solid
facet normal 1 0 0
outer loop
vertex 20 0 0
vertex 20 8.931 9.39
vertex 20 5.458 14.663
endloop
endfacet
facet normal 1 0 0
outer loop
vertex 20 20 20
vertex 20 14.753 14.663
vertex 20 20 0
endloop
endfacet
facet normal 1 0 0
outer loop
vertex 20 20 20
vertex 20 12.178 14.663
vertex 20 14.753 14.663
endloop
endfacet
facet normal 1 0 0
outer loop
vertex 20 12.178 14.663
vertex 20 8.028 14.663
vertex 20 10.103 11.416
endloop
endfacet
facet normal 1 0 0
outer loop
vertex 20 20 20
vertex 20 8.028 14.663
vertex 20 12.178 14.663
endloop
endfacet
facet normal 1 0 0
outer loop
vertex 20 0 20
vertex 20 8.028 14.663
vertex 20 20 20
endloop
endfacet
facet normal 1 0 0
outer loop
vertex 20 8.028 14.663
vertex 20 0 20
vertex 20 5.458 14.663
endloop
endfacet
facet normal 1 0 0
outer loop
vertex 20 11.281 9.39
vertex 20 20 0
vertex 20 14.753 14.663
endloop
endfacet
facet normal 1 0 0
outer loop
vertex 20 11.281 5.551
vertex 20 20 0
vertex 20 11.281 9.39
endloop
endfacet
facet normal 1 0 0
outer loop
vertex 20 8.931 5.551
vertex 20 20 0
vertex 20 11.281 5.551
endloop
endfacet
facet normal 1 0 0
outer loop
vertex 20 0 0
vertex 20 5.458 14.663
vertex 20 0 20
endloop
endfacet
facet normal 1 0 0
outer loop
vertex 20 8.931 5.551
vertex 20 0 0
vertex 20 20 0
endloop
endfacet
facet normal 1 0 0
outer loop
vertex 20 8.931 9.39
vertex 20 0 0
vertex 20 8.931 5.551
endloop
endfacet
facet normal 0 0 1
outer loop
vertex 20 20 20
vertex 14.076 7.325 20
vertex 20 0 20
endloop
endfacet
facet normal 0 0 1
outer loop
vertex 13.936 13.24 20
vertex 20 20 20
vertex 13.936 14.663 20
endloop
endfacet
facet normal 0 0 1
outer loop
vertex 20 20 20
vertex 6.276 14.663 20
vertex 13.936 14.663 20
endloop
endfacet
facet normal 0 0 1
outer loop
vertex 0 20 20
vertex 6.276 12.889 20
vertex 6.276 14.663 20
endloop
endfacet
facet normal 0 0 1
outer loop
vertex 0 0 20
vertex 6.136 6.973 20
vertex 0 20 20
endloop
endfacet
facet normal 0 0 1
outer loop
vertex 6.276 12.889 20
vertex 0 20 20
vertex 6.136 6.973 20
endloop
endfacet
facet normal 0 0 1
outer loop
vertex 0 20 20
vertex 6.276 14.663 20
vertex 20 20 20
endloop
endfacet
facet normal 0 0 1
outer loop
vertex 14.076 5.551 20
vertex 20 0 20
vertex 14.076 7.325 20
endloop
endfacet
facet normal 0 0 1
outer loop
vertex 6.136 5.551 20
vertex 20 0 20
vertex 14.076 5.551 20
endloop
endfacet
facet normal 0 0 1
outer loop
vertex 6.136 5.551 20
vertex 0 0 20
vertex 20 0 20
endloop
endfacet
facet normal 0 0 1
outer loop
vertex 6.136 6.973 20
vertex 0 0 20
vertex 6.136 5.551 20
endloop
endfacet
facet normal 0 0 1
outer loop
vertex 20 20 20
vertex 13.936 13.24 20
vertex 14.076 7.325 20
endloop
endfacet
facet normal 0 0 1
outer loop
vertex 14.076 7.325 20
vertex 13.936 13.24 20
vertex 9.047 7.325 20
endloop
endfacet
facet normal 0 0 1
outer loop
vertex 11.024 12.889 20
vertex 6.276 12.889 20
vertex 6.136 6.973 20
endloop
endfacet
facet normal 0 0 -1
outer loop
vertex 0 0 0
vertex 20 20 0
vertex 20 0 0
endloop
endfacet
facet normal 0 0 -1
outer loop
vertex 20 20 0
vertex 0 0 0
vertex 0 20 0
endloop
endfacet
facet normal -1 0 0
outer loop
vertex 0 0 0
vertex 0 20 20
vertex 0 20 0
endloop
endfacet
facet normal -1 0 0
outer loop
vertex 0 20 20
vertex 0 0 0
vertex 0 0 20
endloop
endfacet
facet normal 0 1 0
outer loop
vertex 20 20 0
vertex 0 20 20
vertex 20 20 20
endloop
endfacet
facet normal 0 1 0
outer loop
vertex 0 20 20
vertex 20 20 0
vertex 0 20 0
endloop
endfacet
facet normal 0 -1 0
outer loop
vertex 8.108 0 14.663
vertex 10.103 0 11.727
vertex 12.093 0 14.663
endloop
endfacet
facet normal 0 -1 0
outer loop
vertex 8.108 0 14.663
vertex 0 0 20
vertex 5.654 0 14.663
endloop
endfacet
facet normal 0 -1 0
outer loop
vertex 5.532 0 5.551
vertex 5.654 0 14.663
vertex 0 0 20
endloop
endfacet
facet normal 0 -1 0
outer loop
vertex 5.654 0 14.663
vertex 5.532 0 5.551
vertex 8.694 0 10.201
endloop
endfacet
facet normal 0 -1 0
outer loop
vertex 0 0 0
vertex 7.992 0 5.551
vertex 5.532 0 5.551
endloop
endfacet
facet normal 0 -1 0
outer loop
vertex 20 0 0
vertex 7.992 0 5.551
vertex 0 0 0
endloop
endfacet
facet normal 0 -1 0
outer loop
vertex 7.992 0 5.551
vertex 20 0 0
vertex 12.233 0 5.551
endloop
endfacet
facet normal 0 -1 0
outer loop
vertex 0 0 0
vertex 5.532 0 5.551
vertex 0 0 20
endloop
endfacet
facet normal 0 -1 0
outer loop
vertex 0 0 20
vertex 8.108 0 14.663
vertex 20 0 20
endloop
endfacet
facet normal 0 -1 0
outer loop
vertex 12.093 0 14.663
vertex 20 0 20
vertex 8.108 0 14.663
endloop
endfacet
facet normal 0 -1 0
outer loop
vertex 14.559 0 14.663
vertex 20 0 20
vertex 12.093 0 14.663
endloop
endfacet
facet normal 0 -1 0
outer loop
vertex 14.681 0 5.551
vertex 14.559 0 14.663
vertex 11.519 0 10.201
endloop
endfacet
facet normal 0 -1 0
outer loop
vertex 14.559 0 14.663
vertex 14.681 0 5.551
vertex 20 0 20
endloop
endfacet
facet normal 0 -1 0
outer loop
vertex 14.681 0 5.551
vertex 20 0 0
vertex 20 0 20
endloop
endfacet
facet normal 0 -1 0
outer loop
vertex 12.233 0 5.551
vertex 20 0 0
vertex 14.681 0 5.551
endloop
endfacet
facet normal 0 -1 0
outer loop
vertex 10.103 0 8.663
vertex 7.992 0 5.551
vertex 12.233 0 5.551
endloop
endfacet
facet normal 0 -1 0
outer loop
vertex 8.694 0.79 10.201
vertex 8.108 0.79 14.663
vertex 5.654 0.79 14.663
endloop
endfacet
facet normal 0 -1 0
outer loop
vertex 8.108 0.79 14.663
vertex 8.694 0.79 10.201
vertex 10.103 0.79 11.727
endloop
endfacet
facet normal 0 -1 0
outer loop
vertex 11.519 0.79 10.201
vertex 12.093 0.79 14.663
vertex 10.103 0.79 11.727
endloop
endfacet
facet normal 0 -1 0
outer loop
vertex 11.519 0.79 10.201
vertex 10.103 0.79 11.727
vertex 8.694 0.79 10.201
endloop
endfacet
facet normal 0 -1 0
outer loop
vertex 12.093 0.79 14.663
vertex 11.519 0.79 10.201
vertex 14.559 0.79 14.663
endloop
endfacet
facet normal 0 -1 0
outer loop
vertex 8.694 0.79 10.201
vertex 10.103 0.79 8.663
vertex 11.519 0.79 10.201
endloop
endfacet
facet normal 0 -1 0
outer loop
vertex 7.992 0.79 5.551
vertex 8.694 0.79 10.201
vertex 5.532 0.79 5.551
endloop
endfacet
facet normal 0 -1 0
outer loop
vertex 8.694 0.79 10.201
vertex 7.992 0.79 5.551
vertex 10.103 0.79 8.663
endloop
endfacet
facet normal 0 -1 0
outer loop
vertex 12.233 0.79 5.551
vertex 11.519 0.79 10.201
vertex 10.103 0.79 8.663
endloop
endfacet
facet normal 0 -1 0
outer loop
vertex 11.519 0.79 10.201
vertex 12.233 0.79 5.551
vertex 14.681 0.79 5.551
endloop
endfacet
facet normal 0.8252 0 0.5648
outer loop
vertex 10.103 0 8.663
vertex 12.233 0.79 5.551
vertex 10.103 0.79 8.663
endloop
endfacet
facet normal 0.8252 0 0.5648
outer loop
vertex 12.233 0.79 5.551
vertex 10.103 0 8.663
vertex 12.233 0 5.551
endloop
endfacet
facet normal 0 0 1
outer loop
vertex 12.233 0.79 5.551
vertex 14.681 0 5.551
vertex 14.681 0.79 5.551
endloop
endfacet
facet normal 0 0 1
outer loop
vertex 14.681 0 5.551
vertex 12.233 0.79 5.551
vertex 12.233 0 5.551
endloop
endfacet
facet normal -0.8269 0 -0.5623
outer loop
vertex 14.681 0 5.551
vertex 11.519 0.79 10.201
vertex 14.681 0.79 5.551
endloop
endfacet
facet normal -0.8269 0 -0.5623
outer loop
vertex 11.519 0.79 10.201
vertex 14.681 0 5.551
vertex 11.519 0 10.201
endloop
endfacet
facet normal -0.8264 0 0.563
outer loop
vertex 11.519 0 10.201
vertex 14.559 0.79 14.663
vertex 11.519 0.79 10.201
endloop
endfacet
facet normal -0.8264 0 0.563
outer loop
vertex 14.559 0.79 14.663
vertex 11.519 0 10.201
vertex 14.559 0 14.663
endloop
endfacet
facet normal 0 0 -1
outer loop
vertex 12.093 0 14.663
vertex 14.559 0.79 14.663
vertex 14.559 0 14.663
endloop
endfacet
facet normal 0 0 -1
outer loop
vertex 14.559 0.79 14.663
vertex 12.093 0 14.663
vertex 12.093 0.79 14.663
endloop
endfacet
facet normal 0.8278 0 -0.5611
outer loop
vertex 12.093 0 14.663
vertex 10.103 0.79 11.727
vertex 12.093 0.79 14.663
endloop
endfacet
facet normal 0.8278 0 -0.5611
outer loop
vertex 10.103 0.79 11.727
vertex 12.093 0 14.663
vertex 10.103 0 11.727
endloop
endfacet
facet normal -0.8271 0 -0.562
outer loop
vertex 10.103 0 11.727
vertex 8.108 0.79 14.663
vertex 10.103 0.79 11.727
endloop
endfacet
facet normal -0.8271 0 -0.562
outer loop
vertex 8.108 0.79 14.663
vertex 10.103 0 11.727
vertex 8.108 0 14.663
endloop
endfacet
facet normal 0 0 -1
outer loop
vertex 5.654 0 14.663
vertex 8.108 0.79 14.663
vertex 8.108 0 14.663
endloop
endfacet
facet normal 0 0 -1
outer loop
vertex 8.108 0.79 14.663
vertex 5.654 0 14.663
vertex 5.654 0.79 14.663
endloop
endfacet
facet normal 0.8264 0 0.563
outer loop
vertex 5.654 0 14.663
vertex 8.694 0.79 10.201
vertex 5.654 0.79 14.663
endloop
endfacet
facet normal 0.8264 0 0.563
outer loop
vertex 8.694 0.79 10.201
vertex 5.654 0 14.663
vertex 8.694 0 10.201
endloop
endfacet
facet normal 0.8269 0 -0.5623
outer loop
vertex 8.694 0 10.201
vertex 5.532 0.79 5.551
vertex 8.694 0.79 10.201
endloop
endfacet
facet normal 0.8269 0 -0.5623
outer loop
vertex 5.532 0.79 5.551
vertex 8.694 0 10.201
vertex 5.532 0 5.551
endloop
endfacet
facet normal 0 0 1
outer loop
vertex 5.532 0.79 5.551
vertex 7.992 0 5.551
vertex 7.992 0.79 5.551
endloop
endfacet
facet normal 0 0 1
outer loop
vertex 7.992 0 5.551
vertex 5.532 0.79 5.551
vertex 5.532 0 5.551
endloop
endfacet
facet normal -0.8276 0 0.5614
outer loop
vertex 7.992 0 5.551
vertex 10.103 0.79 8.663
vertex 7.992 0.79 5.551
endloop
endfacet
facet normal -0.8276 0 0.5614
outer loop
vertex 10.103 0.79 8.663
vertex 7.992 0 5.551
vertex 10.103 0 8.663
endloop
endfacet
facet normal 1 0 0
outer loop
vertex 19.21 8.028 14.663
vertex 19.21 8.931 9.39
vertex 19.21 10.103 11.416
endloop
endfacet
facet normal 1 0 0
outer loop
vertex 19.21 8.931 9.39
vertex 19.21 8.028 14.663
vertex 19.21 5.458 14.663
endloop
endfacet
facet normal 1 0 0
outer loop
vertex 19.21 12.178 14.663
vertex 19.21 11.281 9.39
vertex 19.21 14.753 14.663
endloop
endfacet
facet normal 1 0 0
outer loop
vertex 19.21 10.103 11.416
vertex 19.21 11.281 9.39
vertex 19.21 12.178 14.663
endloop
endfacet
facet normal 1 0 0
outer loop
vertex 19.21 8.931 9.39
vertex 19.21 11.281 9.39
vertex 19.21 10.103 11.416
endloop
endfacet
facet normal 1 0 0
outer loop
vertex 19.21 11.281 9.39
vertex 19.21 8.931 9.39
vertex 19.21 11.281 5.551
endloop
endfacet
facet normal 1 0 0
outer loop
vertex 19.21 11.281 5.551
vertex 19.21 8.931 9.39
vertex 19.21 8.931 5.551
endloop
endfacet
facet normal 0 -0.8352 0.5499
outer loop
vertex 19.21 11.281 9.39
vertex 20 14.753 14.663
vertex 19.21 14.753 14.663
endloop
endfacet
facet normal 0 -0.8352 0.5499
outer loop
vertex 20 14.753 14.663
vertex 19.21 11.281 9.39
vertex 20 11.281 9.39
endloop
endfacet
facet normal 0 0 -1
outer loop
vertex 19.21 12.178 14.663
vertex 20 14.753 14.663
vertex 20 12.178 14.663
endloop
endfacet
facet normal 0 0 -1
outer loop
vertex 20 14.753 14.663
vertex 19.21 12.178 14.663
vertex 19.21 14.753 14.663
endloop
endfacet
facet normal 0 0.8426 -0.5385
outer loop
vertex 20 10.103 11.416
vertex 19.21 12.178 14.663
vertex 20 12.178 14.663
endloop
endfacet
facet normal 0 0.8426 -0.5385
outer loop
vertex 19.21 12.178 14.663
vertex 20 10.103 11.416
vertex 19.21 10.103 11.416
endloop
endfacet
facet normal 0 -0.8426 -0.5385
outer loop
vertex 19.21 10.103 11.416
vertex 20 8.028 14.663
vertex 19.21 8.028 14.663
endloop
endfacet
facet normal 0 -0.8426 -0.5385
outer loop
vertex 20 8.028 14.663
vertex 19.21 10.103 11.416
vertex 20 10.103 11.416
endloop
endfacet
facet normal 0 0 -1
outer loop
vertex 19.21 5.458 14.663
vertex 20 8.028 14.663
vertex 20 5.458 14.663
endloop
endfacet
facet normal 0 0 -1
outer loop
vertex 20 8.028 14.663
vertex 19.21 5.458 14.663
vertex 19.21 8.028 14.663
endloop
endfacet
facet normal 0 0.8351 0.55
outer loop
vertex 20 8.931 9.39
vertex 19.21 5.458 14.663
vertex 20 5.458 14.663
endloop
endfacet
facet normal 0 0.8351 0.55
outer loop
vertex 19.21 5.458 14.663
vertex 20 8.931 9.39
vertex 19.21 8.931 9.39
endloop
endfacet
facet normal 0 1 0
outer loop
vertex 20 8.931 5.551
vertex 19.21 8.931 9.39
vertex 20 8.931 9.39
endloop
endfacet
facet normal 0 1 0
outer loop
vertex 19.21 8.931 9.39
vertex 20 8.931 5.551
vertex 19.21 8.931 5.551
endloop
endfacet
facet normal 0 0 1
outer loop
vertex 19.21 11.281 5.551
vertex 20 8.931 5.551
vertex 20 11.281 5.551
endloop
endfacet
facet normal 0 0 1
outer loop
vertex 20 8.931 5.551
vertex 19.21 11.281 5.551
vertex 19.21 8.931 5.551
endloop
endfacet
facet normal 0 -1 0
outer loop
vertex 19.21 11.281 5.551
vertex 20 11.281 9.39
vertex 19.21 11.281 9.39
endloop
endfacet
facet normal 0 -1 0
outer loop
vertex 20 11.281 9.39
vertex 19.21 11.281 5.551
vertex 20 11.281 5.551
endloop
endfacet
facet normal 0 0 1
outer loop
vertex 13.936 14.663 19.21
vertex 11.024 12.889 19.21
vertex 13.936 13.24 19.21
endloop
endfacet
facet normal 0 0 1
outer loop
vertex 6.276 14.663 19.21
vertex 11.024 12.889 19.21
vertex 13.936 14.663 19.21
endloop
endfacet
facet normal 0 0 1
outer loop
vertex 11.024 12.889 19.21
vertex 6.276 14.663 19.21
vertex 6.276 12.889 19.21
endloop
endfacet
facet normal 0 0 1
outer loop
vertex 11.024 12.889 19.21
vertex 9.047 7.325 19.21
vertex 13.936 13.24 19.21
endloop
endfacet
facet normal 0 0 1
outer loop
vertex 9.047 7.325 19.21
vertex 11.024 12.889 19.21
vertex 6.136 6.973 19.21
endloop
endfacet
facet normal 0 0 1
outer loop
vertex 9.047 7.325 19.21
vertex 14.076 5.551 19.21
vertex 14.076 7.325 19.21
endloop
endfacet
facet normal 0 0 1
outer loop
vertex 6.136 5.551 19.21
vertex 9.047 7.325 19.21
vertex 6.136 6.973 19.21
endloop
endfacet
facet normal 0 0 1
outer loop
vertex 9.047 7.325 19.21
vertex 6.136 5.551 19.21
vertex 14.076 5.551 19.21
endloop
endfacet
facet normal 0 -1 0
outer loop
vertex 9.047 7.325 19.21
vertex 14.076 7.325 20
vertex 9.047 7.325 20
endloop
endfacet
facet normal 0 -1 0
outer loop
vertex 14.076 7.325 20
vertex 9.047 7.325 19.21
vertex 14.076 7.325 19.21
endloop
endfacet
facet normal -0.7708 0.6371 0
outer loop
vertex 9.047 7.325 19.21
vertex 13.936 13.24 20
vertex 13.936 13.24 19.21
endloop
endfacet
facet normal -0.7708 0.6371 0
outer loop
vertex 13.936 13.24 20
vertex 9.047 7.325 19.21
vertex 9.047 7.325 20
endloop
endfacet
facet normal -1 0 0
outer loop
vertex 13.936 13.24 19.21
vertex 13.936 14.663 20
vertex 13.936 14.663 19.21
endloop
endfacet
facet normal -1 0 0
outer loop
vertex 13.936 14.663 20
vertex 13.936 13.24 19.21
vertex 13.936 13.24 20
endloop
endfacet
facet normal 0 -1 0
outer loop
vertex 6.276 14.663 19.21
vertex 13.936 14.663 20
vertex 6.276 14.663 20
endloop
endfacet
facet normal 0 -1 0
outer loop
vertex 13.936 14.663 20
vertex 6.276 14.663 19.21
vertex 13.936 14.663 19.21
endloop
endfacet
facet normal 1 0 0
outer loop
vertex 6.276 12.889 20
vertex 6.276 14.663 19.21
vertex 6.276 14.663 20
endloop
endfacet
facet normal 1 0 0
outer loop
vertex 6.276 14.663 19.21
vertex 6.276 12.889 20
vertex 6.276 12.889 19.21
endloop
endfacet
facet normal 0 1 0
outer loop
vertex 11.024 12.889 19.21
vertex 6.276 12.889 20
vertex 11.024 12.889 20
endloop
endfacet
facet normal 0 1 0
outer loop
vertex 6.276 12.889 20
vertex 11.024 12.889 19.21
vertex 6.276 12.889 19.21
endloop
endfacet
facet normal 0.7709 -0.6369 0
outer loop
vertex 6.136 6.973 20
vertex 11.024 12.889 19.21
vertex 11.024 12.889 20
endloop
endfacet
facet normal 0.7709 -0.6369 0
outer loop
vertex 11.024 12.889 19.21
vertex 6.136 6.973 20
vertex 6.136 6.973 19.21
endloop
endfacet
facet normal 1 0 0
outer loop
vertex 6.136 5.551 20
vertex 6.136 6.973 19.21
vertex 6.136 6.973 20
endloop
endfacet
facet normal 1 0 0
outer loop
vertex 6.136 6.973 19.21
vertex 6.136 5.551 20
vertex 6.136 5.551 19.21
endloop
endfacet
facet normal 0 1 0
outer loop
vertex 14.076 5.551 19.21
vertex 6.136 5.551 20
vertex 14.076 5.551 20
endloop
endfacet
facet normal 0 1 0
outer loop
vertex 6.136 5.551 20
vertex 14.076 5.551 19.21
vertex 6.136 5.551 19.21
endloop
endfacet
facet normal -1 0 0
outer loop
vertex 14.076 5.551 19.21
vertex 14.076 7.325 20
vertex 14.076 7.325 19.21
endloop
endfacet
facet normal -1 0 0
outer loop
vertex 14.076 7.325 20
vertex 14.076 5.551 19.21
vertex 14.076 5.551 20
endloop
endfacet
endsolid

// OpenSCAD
// Cubo de calibração 20 mm com X, Y e Z gravados: meça com o paquímetro e ajuste fluxo e dimensões.
lado = 20;
parte = "cubo";
fonte = "Poppins:style=Bold";
module letra(s) linear_extrude(0.8) text(s, size = lado * 0.45, font = fonte, halign = "center", valign = "center");
if (parte == "cubo") difference() {
  cube([lado, lado, lado]);
  translate([lado / 2, -0.01, lado / 2]) rotate([90, 0, 0]) mirror([0, 0, 1]) letra("X");   // frente: eixo X
  translate([lado + 0.01, lado / 2, lado / 2]) rotate([90, 0, 90]) mirror([0, 0, 1]) letra("Y");   // lado: eixo Y
  translate([lado / 2, lado / 2, lado - 0.79]) letra("Z");                                 // topo: eixo Z
}
